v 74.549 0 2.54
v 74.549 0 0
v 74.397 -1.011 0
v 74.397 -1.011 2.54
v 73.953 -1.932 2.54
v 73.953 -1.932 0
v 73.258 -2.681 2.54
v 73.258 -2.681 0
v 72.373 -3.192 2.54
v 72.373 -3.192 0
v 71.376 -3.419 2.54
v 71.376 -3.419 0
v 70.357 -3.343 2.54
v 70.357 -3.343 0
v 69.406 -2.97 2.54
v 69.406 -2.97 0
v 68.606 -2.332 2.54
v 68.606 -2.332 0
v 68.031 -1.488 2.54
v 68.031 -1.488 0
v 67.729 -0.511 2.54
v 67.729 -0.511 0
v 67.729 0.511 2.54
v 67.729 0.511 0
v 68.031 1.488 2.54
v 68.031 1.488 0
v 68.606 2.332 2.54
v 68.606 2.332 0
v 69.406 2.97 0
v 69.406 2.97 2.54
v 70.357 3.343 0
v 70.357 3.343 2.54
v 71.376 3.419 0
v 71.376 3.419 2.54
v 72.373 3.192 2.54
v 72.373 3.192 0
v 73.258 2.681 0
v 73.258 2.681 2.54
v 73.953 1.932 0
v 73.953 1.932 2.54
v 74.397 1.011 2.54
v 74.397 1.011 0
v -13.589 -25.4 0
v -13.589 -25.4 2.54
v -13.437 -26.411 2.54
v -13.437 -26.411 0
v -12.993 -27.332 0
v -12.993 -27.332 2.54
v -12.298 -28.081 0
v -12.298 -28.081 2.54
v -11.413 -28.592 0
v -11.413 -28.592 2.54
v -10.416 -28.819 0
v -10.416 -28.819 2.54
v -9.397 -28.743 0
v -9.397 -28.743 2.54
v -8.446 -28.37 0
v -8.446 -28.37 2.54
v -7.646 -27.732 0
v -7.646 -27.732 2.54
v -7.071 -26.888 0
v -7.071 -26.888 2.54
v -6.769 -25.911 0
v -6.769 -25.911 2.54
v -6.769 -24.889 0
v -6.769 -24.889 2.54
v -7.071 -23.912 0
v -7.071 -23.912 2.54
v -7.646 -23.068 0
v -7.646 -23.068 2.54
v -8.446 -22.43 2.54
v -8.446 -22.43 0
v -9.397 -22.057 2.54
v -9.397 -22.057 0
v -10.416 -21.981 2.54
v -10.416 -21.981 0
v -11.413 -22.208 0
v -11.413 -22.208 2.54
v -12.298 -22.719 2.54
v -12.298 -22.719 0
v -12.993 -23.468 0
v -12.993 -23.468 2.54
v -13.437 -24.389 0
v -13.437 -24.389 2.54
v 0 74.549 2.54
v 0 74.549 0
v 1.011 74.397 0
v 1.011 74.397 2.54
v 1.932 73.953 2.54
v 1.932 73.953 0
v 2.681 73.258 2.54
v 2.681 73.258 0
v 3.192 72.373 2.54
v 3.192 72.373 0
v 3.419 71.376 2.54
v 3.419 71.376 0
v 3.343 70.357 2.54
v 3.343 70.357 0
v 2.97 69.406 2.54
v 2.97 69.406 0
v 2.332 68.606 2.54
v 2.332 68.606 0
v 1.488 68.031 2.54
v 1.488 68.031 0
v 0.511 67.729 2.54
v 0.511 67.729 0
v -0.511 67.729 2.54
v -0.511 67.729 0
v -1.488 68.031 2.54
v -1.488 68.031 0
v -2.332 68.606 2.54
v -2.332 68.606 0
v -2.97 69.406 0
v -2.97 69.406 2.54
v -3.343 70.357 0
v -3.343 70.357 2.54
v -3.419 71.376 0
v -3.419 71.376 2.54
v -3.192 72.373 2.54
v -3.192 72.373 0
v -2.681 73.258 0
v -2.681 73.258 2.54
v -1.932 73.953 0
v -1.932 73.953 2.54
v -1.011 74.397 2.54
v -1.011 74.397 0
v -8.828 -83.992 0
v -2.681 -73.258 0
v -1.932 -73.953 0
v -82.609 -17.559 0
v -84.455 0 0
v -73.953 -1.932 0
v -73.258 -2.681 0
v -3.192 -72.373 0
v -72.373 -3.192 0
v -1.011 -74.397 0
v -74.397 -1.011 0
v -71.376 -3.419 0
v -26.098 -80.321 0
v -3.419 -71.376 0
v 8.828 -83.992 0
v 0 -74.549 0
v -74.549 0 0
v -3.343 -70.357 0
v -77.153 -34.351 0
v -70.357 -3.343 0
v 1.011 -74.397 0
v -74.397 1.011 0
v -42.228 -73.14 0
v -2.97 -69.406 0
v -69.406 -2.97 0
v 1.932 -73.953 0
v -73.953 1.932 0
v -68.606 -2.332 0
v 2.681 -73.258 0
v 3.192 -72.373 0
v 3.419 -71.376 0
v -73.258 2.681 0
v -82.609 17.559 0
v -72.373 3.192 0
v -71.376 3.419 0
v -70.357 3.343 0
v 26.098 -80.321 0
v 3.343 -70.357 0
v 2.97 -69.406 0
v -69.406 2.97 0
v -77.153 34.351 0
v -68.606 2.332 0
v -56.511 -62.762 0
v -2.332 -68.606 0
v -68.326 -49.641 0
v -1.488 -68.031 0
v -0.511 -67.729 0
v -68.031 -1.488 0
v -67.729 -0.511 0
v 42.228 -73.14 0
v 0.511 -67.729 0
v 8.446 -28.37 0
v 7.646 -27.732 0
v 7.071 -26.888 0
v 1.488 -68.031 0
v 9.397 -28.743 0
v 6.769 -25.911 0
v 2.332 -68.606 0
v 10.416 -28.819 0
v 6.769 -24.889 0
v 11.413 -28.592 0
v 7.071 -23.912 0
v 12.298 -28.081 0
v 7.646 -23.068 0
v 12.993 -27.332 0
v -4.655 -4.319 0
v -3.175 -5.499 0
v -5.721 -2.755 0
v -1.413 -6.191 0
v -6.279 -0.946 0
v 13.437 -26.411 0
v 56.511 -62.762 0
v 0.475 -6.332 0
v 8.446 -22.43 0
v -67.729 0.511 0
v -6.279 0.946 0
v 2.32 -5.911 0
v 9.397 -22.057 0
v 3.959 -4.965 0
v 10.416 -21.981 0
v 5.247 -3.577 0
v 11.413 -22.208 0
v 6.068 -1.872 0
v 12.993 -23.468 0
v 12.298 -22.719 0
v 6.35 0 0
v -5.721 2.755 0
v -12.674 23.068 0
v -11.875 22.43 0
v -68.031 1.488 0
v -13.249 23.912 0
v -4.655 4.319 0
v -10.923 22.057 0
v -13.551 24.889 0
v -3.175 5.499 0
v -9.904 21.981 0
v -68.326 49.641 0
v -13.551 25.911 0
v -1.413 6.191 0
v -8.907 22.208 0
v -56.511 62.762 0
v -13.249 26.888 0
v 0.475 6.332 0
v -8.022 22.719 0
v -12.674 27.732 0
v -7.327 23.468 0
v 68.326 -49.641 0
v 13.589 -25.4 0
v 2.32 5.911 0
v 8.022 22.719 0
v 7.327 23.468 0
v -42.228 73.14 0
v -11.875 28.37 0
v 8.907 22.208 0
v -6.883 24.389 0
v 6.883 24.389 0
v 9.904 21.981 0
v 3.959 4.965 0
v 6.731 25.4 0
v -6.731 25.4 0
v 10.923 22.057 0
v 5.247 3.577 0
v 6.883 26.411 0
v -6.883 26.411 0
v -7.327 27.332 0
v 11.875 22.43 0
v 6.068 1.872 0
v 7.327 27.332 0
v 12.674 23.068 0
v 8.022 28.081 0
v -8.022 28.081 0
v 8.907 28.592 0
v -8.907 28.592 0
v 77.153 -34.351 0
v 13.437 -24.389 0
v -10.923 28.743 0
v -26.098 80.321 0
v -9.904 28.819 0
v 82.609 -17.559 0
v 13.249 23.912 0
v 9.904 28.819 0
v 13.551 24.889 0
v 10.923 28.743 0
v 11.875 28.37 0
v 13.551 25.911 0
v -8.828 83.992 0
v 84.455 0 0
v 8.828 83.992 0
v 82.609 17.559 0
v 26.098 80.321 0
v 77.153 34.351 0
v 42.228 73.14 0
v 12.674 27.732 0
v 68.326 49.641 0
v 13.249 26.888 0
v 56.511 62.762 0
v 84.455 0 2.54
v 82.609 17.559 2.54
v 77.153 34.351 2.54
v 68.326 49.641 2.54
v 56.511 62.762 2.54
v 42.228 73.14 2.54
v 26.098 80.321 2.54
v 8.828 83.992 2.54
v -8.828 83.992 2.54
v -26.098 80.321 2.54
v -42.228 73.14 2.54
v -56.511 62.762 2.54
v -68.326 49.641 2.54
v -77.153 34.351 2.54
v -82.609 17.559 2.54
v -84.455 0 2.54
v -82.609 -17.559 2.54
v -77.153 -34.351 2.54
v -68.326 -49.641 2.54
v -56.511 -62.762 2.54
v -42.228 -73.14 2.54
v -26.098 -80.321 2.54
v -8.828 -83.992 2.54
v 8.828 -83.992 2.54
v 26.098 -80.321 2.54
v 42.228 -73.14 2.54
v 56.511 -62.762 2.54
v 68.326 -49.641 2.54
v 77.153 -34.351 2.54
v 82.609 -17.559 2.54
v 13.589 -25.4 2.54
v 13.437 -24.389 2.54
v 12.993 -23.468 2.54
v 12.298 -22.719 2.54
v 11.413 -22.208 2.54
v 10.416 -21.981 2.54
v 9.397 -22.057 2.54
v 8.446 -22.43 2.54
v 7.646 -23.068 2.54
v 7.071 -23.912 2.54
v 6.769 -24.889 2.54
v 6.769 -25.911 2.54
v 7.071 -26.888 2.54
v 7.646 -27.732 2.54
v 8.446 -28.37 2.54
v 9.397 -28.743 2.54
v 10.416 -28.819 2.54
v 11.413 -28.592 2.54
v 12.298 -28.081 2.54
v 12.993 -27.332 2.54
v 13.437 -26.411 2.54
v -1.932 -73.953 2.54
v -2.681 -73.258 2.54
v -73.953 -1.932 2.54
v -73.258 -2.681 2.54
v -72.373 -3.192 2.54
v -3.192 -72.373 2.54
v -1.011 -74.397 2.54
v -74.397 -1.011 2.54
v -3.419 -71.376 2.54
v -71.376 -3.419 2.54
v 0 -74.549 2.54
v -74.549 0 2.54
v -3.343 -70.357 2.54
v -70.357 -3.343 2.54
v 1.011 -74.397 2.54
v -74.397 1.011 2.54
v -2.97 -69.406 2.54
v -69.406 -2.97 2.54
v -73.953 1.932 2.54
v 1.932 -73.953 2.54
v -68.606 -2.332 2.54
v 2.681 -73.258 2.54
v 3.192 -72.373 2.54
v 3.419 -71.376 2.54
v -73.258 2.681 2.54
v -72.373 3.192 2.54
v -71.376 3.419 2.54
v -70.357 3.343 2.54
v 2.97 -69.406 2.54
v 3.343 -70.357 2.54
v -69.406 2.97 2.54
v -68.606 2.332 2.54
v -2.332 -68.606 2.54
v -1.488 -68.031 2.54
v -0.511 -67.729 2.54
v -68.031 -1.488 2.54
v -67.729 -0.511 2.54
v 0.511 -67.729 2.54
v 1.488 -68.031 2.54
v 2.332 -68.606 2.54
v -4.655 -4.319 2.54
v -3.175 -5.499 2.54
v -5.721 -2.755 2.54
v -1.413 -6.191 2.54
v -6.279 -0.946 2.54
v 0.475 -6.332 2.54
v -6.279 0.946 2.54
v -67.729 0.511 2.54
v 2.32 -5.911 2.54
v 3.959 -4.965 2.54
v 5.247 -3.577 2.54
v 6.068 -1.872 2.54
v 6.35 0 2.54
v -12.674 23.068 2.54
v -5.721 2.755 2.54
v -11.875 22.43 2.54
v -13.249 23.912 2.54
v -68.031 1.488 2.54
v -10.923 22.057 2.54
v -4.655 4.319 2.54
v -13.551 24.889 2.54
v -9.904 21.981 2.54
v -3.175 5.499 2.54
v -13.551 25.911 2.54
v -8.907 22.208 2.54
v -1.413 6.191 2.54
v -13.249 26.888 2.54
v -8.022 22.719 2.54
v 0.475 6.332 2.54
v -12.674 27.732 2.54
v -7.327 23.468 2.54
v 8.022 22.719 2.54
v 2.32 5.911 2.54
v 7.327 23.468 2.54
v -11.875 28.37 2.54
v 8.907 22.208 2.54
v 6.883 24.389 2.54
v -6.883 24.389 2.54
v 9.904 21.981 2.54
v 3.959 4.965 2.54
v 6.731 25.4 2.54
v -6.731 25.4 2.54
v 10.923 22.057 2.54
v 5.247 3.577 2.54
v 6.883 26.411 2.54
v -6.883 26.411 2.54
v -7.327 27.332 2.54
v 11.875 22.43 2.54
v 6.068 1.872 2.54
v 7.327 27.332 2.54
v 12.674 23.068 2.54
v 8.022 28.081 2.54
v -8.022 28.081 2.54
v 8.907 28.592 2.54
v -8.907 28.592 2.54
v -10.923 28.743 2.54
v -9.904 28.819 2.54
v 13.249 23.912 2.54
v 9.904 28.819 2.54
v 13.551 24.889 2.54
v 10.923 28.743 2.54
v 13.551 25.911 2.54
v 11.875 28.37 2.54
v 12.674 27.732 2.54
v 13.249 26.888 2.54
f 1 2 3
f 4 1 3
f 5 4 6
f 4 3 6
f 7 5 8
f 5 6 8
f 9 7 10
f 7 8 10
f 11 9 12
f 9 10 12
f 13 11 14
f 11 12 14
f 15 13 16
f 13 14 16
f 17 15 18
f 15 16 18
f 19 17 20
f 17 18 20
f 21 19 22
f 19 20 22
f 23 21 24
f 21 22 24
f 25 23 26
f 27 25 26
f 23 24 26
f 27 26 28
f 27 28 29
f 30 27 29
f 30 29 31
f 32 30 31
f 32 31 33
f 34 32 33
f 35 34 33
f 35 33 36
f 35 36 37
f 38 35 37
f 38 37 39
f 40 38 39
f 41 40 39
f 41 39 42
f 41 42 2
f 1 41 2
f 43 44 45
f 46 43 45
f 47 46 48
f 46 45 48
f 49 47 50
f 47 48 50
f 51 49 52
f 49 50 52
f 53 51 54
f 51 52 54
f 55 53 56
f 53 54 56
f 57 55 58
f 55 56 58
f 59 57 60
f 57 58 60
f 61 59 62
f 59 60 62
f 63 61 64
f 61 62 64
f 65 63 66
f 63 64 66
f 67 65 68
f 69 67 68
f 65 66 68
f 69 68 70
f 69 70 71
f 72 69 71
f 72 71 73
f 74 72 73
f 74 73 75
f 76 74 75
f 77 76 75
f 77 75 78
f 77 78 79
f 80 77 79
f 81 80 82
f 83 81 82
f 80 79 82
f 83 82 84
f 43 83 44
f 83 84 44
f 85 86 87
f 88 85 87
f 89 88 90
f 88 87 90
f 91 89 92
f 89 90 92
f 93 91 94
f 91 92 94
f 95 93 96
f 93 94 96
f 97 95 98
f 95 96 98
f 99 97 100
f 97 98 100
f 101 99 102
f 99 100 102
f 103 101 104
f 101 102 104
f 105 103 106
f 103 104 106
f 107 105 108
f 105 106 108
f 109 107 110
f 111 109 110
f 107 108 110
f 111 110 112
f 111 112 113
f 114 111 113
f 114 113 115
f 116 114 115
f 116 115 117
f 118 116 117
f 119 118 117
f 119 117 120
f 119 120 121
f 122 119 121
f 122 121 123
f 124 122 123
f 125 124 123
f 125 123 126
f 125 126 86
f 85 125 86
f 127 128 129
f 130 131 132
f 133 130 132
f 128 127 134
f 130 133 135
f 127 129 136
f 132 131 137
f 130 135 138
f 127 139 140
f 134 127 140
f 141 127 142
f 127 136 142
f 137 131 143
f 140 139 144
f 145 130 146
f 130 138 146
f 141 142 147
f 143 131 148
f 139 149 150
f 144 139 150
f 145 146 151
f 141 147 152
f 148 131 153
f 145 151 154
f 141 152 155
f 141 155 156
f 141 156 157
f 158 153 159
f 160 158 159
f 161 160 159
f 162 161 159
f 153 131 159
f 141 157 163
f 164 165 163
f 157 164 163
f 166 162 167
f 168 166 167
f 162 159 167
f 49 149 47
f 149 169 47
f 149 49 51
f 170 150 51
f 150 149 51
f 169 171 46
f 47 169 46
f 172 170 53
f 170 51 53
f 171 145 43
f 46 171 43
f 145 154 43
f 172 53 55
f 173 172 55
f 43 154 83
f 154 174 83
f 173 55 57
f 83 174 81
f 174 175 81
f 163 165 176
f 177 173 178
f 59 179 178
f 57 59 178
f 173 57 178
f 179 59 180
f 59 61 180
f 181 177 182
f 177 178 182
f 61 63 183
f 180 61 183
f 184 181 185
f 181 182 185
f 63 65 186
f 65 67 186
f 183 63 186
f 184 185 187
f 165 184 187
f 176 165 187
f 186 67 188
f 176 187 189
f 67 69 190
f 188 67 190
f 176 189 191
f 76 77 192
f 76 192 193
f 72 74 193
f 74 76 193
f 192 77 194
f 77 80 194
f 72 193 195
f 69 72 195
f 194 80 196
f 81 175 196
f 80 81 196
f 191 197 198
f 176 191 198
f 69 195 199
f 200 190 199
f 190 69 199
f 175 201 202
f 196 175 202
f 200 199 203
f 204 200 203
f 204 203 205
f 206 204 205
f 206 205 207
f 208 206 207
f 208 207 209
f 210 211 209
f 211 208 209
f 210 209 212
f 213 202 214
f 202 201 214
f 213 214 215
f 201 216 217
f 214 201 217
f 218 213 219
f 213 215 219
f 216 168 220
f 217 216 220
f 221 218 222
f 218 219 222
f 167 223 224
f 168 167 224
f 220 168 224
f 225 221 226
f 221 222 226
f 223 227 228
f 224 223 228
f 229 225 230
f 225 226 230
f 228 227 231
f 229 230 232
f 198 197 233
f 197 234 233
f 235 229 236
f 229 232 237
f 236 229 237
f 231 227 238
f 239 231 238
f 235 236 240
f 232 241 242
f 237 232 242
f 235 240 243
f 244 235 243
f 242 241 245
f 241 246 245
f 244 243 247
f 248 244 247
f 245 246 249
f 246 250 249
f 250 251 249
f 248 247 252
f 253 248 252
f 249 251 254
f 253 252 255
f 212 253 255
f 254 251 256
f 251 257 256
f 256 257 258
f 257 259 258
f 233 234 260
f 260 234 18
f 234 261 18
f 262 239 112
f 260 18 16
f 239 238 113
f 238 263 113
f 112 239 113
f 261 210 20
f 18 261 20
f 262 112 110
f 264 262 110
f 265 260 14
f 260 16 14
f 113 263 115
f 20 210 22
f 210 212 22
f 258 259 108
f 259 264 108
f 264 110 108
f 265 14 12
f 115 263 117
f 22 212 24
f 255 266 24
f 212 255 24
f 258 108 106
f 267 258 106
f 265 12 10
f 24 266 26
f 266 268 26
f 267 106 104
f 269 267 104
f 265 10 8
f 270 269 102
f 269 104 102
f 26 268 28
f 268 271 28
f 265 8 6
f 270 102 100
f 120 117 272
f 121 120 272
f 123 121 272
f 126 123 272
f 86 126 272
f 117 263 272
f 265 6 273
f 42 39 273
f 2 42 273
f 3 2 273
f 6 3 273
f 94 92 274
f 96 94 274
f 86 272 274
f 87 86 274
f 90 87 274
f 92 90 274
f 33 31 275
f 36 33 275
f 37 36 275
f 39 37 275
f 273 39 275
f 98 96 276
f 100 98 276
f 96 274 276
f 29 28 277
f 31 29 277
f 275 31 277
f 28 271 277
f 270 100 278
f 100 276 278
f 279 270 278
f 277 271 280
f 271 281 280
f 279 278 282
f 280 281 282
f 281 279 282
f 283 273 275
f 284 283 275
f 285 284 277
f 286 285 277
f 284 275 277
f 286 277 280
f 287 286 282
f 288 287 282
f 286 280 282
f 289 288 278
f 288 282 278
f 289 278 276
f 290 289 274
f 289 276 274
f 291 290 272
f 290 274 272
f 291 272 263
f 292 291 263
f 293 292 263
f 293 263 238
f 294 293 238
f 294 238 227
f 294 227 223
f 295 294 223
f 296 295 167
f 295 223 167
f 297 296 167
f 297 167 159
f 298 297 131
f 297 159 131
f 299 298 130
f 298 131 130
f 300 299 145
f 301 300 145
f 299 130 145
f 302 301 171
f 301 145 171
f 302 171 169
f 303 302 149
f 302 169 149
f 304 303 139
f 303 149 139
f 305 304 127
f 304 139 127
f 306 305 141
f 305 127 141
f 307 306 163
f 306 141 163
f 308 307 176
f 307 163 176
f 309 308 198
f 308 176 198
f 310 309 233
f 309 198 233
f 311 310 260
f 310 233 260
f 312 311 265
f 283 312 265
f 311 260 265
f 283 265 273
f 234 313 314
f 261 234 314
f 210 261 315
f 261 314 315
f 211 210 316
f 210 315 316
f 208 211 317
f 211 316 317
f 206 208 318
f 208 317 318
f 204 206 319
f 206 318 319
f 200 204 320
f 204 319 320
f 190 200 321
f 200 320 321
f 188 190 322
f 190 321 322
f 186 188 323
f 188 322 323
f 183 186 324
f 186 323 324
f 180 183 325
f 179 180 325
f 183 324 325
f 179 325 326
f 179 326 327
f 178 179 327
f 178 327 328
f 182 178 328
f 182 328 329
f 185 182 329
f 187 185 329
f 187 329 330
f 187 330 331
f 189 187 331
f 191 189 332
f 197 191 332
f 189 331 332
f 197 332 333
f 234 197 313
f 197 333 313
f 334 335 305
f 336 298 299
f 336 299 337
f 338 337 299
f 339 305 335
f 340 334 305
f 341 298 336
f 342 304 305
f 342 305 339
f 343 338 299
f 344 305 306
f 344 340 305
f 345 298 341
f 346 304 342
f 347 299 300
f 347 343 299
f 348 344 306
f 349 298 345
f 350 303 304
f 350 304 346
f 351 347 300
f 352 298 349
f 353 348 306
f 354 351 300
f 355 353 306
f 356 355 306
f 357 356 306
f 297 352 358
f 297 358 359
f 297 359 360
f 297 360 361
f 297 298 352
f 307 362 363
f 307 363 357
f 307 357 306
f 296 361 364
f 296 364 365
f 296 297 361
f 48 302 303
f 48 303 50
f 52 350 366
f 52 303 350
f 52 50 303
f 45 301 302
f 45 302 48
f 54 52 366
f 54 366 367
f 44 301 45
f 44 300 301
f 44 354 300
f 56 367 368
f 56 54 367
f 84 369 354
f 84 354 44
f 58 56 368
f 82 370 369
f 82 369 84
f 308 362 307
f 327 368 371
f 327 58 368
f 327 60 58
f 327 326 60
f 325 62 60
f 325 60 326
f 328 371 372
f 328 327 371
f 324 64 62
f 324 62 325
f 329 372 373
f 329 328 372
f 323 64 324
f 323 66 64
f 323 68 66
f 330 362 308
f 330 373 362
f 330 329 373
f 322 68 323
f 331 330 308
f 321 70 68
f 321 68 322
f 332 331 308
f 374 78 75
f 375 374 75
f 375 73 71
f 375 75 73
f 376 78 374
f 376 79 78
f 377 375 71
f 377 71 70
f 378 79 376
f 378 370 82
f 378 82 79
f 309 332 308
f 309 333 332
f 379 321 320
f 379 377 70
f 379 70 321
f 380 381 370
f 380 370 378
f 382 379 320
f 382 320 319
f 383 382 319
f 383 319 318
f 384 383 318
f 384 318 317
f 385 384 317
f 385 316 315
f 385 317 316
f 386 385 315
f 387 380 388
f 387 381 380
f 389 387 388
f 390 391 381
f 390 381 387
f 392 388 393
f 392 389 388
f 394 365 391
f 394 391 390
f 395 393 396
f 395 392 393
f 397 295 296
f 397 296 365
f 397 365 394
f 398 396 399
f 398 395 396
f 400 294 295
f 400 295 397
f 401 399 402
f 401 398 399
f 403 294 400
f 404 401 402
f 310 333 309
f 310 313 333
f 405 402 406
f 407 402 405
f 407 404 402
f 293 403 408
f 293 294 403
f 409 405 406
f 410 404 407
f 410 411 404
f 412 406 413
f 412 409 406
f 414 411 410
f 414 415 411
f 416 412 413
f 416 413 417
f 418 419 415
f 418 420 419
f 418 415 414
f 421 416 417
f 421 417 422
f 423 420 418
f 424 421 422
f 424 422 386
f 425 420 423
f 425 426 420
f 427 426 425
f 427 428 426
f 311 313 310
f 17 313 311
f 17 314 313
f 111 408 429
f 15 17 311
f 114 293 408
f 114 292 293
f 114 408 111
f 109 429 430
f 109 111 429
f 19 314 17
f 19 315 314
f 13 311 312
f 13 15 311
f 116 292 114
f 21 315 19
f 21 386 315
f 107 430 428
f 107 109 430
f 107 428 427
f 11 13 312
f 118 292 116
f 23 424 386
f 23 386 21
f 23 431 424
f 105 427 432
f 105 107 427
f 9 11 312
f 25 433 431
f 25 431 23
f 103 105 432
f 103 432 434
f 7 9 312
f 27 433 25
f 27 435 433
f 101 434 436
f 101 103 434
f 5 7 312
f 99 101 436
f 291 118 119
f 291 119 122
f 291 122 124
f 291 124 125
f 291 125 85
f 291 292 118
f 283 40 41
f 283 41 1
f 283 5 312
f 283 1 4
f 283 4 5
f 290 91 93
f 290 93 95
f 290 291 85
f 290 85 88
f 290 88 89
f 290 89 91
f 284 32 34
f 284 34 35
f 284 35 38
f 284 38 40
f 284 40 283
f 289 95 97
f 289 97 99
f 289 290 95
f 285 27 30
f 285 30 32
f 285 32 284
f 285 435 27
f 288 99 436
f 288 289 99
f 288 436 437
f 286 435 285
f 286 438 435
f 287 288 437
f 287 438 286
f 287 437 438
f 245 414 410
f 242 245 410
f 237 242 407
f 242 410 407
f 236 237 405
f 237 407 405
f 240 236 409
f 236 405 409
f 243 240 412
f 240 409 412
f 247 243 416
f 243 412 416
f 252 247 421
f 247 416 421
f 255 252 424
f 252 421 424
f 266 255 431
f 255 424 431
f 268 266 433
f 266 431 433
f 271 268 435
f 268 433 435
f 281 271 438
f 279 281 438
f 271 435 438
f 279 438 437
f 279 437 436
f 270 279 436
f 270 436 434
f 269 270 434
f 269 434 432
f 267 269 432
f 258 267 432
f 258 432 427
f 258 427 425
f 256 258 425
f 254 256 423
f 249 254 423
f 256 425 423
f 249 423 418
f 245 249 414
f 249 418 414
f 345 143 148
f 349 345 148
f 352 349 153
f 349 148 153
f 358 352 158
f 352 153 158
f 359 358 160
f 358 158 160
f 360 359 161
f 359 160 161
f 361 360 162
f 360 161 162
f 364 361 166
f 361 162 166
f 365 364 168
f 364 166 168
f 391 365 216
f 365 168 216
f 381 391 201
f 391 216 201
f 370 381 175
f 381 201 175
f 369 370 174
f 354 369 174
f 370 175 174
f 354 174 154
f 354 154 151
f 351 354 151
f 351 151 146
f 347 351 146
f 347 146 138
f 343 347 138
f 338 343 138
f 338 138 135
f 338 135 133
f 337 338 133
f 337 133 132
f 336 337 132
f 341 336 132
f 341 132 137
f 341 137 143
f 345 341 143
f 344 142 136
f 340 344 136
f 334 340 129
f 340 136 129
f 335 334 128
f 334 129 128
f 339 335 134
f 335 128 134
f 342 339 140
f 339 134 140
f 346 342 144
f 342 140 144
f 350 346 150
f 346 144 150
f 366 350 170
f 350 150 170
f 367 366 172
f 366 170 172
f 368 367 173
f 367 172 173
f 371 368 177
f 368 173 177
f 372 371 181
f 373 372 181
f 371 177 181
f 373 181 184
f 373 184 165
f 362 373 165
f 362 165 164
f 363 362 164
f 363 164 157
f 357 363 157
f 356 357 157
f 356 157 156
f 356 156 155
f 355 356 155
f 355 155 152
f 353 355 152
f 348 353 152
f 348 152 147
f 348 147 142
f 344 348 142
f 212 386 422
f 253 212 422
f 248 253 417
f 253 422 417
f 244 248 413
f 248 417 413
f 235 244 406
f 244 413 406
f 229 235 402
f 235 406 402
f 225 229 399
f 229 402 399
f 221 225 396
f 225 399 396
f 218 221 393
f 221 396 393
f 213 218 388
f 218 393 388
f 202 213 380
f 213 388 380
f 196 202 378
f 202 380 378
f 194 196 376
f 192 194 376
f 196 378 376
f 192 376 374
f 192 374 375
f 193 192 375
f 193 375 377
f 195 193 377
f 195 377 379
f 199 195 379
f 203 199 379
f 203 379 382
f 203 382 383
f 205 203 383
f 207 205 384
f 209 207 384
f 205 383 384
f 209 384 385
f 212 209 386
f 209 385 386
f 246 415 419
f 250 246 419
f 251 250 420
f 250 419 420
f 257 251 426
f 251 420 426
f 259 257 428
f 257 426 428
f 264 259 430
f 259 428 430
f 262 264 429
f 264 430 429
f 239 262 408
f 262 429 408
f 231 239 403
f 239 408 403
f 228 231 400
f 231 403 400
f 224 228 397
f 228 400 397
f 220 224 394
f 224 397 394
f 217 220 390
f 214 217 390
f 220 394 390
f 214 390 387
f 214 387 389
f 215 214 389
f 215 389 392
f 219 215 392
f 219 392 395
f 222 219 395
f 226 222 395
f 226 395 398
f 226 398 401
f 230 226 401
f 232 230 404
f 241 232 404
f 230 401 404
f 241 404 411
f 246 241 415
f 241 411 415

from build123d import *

# Parameters (mm, degrees)
SKETCH1_R           = 84.455
BOSS_EXTRUDE1_DEPTH = 2.54
SKETCH2_R           = 3.429
CUT_EXTRUDE1_DEPTH  = 2.54
SKETCH3_R           = 6.35
CUT_EXTRUDE2_DEPTH  = 2.54
SKETCH4_R           = 3.429
CUT_EXTRUDE3_DEPTH  = 120.464411646
CIRPATTERN1_COUNT   = 4


with BuildPart() as part:
    # Sketch1 → Boss-Extrude1 (new body)
    with BuildSketch(Plane.XY):
        Circle(SKETCH1_R)
    extrude(amount=BOSS_EXTRUDE1_DEPTH)

    # Sketch2 → Cut-Extrude1 (cut)
    with BuildSketch(Plane.XY.offset(2.54)):
        with Locations((-10.16, 25.4)):
            Circle(SKETCH2_R)
        with Locations(Location((10.16, 25.4, 0), (0, 0, 180))):
            Circle(SKETCH2_R)
        with Locations((10.16, -25.4)):
            Circle(SKETCH2_R)
        with Locations(Location((-10.16, -25.4, 0), (0, 0, 180))):
            Circle(SKETCH2_R)
    extrude(amount=-CUT_EXTRUDE1_DEPTH, mode=Mode.SUBTRACT)

    # Sketch3 → Cut-Extrude2 (cut)
    with BuildSketch(Plane.XY.offset(2.54)):
        Circle(SKETCH3_R)
    extrude(amount=-CUT_EXTRUDE2_DEPTH, mode=Mode.SUBTRACT)

    # Sketch4 → Cut-Extrude3 (cut, through all)
    with BuildSketch(Plane(origin=(0, 0, 0), x_dir=(-1, 0, 0), z_dir=(0, 0, -1))):
        with Locations((71.12, 0)):
            Circle(SKETCH4_R)
    cut_extrude3 = extrude(amount=-CUT_EXTRUDE3_DEPTH, mode=Mode.SUBTRACT)

    # CirPattern1: Cut-Extrude3 ×4 about axis
    cirpattern1_axis = Axis((0, 0, 0), (0, 0, 1))
    for i in range(1, CIRPATTERN1_COUNT):
        add(cut_extrude3.rotate(cirpattern1_axis, i * 360 / CIRPATTERN1_COUNT), mode=Mode.SUBTRACT)


solid = part.part
